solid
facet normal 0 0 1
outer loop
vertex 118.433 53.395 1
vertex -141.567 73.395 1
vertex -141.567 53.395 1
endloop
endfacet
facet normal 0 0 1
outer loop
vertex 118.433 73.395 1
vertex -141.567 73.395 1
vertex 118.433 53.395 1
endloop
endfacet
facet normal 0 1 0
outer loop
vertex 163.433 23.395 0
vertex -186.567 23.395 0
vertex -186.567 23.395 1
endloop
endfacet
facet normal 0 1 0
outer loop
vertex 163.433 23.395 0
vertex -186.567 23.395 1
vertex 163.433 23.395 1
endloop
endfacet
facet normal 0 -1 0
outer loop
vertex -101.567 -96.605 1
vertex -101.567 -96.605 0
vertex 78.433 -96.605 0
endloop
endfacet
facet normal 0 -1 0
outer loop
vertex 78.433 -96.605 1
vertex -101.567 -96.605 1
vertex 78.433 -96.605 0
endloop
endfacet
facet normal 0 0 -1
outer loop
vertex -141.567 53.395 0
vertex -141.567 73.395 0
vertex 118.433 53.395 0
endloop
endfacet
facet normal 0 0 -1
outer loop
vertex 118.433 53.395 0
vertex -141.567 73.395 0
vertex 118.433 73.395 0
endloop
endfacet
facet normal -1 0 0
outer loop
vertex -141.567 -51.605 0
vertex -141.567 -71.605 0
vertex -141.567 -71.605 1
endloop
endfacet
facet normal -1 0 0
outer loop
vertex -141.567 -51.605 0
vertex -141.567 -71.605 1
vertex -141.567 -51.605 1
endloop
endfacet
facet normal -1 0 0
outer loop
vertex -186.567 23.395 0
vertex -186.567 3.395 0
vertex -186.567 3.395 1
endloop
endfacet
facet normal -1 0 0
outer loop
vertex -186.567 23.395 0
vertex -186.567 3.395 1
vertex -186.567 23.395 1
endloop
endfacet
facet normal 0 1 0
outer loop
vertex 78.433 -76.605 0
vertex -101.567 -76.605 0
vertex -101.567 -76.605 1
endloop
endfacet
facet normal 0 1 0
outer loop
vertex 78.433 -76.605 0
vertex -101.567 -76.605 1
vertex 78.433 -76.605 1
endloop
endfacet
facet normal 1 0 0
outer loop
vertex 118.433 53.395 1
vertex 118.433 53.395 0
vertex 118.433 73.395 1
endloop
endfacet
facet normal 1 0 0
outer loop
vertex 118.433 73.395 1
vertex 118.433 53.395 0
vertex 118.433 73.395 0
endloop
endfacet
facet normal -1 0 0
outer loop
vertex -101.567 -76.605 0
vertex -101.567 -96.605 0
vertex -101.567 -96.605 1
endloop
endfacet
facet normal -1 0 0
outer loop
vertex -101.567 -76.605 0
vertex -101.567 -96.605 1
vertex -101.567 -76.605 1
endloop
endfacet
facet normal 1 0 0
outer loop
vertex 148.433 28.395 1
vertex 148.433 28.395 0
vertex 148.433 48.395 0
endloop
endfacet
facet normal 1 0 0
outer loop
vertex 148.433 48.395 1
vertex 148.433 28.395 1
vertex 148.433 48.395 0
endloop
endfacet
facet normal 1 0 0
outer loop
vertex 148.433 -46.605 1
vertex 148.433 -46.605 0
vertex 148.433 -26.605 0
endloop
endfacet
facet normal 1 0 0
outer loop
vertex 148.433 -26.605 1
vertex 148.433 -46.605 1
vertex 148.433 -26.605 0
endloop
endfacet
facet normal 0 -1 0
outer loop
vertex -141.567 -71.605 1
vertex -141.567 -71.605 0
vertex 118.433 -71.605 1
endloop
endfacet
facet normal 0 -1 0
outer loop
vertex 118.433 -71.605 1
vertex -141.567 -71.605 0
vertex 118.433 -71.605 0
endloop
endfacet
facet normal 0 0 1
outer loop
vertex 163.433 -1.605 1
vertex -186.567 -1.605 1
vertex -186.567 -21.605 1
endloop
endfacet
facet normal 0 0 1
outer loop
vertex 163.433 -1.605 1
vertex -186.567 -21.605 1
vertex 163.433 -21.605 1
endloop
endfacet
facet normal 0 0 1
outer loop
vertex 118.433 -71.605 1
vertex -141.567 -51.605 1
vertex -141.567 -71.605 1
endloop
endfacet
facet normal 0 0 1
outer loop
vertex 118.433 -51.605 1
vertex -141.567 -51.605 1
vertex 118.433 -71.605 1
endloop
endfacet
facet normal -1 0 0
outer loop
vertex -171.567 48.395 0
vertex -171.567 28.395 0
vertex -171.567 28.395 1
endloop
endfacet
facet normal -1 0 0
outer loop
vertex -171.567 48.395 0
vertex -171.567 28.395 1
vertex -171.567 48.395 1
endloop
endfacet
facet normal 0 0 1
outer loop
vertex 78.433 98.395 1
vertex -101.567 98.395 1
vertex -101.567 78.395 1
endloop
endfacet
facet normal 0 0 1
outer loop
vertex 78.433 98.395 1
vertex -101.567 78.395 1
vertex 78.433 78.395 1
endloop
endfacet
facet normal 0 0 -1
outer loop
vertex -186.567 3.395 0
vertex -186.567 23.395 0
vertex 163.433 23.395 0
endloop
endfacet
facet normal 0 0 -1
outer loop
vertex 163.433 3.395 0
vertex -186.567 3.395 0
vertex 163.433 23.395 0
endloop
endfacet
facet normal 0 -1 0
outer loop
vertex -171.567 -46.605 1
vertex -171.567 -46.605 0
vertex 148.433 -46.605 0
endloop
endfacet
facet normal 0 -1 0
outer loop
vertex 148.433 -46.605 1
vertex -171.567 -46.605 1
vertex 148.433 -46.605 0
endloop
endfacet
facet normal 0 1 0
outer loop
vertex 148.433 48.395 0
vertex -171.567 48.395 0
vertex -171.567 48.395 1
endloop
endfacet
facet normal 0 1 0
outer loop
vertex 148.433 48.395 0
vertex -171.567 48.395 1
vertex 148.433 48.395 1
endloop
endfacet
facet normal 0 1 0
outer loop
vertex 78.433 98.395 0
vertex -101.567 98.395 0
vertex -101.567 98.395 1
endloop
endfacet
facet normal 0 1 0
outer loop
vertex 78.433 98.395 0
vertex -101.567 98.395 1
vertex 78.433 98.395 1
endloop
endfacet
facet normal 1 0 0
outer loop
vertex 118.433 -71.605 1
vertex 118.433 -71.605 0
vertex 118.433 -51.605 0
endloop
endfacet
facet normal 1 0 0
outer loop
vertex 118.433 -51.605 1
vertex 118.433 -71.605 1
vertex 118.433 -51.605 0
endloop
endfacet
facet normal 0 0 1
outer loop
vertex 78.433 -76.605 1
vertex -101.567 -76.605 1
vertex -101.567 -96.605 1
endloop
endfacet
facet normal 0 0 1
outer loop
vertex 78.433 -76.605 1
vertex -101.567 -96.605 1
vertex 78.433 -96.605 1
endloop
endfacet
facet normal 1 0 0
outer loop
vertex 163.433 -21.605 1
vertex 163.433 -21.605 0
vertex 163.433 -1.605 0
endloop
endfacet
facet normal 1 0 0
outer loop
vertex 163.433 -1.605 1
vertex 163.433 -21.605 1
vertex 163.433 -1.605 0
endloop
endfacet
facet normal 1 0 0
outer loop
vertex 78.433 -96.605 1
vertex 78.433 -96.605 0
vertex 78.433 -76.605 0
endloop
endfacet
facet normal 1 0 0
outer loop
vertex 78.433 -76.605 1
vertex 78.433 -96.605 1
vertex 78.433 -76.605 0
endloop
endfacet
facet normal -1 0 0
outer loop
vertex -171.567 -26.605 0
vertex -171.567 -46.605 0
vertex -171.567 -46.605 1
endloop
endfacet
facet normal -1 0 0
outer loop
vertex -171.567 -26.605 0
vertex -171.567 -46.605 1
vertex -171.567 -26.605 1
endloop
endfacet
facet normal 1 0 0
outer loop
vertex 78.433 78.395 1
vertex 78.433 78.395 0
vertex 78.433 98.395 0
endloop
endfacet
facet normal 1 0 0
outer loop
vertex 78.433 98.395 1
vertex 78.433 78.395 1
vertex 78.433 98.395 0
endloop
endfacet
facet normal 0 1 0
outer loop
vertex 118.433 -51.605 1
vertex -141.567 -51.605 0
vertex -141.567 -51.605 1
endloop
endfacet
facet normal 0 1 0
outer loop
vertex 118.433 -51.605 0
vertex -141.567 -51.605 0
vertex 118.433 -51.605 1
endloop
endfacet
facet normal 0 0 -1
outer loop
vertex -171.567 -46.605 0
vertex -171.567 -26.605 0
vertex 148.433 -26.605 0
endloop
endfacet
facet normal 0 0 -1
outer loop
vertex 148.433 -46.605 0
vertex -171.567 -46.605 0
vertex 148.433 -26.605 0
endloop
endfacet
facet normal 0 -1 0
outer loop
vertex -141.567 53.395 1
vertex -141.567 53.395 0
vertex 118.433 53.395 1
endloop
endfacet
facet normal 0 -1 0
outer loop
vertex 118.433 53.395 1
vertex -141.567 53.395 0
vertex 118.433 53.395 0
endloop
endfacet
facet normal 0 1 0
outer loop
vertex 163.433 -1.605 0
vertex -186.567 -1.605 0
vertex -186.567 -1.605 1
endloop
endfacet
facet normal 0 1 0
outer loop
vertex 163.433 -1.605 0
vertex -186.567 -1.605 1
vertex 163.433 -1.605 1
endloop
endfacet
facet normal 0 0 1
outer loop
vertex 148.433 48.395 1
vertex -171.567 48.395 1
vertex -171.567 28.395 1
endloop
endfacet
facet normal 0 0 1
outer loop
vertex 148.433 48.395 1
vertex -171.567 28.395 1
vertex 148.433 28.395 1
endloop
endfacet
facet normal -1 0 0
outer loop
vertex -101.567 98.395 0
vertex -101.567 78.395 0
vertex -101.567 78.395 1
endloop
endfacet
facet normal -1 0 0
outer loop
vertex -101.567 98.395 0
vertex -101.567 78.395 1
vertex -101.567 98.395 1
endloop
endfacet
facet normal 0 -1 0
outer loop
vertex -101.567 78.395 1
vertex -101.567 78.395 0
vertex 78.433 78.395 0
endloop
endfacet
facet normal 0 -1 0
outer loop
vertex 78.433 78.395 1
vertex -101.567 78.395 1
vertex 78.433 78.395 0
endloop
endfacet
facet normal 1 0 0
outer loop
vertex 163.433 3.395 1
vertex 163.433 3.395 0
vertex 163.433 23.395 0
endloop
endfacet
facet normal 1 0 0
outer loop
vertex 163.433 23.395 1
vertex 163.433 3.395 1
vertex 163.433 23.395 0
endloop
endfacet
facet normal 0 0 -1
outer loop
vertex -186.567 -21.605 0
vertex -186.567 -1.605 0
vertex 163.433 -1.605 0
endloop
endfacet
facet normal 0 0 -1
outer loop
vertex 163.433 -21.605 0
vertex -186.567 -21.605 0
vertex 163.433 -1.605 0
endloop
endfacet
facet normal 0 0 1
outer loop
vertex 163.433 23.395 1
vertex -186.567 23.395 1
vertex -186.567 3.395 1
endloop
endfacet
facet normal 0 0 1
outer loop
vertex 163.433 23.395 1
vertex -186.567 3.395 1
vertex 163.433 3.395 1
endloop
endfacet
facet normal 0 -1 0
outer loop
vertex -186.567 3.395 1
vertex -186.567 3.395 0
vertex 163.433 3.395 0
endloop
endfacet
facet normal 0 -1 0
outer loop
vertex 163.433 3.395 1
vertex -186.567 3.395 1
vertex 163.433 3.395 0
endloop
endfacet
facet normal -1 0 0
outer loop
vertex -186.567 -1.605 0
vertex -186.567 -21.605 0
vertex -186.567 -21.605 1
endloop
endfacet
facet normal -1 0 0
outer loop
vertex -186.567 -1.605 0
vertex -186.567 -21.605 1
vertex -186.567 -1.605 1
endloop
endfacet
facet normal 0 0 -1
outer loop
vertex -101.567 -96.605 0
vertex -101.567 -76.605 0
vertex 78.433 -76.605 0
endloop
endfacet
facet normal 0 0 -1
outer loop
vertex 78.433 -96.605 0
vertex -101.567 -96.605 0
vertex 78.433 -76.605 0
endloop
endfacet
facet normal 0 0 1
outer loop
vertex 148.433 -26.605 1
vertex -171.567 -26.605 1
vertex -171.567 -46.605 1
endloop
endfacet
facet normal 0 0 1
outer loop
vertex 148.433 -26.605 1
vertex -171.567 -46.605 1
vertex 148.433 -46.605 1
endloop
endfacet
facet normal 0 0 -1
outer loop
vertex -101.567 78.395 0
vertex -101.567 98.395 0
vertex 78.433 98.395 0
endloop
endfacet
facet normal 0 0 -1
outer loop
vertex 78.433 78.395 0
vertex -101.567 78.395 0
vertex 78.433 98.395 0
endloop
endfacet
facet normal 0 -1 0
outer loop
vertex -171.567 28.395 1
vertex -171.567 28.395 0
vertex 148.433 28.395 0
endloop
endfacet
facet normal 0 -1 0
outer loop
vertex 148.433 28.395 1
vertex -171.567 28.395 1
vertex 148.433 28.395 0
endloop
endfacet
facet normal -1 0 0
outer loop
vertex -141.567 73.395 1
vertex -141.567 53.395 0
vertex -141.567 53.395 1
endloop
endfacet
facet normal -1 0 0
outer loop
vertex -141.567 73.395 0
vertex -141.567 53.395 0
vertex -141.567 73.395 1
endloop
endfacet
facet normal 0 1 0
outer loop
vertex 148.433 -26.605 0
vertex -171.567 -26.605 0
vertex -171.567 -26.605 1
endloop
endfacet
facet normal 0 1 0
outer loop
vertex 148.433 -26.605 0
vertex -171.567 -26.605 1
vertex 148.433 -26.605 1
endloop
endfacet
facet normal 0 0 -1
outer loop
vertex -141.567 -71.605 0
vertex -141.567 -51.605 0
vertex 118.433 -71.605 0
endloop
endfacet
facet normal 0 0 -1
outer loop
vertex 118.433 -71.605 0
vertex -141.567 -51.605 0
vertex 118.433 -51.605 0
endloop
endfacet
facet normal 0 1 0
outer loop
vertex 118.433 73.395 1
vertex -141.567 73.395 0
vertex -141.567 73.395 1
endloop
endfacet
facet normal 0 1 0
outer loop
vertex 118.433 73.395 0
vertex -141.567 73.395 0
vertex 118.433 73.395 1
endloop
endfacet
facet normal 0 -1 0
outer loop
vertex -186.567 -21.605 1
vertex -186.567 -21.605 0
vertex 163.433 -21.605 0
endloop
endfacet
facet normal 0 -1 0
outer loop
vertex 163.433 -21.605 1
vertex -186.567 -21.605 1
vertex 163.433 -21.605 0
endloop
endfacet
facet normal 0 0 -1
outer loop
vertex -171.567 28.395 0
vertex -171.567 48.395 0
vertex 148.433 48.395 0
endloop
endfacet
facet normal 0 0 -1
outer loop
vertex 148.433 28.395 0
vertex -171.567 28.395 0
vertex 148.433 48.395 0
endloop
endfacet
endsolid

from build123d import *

# Parameters (mm, degrees)
ESQUISSE1_W          = 350
ESQUISSE1_H          = 20
BOSS_EXTRU_1_DEPTH   = 1
ESQUISSE1_W_2        = 320
BOSS_EXTRU_1_2_DEPTH = 1
ESQUISSE1_W_3        = 260
BOSS_EXTRU_1_3_DEPTH = 1
ESQUISSE1_W_4        = 180
BOSS_EXTRU_1_4_DEPTH = 1
BOSS_EXTRU_1_5_DEPTH = 1
BOSS_EXTRU_1_6_DEPTH = 1
BOSS_EXTRU_1_7_DEPTH = 1
BOSS_EXTRU_1_8_DEPTH = 1


with BuildPart() as part:
    # Esquisse1 → Boss.-Extru.1 (new body)
    with BuildSketch(Plane.XY):
        with Locations((-11.56678578, 13.394600175)):
            Rectangle(ESQUISSE1_W, ESQUISSE1_H)
    extrude(amount=BOSS_EXTRU_1_DEPTH)


with BuildPart() as body_2:
    # Esquisse1 → Boss.-Extru.1 2 (new body)
    with BuildSketch(Plane.XY):
        with Locations((-11.56678578, 38.394600175)):
            Rectangle(ESQUISSE1_W_2, ESQUISSE1_H)
    extrude(amount=BOSS_EXTRU_1_2_DEPTH)


with BuildPart() as body_3:
    # Esquisse1 → Boss.-Extru.1 3 (new body)
    with BuildSketch(Plane.XY):
        with Locations((-11.56678578, 63.394600175)):
            Rectangle(ESQUISSE1_W_3, ESQUISSE1_H)
    extrude(amount=BOSS_EXTRU_1_3_DEPTH)


with BuildPart() as body_4:
    # Esquisse1 → Boss.-Extru.1 4 (new body)
    with BuildSketch(Plane.XY):
        with Locations((-11.56678578, 88.394600175)):
            Rectangle(ESQUISSE1_W_4, ESQUISSE1_H)
    extrude(amount=BOSS_EXTRU_1_4_DEPTH)


with BuildPart() as body_5:
    # Esquisse1 → Boss.-Extru.1 5 (new body)
    with BuildSketch(Plane.XY):
        with Locations((-11.56678578, -11.605399825)):
            Rectangle(ESQUISSE1_W, ESQUISSE1_H)
    extrude(amount=BOSS_EXTRU_1_5_DEPTH)


with BuildPart() as body_6:
    # Esquisse1 → Boss.-Extru.1 6 (new body)
    with BuildSketch(Plane.XY):
        with Locations((-11.56678578, -36.605399825)):
            Rectangle(ESQUISSE1_W_2, ESQUISSE1_H)
    extrude(amount=BOSS_EXTRU_1_6_DEPTH)


with BuildPart() as body_7:
    # Esquisse1 → Boss.-Extru.1 7 (new body)
    with BuildSketch(Plane.XY):
        with Locations((-11.56678578, -61.605399825)):
            Rectangle(ESQUISSE1_W_3, ESQUISSE1_H)
    extrude(amount=BOSS_EXTRU_1_7_DEPTH)


with BuildPart() as body_8:
    # Esquisse1 → Boss.-Extru.1 8 (new body)
    with BuildSketch(Plane.XY):
        with Locations((-11.56678578, -86.605399825)):
            Rectangle(ESQUISSE1_W_4, ESQUISSE1_H)
    extrude(amount=BOSS_EXTRU_1_8_DEPTH)


solid = Compound([part.part, body_2.part, body_3.part, body_4.part, body_5.part, body_6.part, body_7.part, body_8.part])
